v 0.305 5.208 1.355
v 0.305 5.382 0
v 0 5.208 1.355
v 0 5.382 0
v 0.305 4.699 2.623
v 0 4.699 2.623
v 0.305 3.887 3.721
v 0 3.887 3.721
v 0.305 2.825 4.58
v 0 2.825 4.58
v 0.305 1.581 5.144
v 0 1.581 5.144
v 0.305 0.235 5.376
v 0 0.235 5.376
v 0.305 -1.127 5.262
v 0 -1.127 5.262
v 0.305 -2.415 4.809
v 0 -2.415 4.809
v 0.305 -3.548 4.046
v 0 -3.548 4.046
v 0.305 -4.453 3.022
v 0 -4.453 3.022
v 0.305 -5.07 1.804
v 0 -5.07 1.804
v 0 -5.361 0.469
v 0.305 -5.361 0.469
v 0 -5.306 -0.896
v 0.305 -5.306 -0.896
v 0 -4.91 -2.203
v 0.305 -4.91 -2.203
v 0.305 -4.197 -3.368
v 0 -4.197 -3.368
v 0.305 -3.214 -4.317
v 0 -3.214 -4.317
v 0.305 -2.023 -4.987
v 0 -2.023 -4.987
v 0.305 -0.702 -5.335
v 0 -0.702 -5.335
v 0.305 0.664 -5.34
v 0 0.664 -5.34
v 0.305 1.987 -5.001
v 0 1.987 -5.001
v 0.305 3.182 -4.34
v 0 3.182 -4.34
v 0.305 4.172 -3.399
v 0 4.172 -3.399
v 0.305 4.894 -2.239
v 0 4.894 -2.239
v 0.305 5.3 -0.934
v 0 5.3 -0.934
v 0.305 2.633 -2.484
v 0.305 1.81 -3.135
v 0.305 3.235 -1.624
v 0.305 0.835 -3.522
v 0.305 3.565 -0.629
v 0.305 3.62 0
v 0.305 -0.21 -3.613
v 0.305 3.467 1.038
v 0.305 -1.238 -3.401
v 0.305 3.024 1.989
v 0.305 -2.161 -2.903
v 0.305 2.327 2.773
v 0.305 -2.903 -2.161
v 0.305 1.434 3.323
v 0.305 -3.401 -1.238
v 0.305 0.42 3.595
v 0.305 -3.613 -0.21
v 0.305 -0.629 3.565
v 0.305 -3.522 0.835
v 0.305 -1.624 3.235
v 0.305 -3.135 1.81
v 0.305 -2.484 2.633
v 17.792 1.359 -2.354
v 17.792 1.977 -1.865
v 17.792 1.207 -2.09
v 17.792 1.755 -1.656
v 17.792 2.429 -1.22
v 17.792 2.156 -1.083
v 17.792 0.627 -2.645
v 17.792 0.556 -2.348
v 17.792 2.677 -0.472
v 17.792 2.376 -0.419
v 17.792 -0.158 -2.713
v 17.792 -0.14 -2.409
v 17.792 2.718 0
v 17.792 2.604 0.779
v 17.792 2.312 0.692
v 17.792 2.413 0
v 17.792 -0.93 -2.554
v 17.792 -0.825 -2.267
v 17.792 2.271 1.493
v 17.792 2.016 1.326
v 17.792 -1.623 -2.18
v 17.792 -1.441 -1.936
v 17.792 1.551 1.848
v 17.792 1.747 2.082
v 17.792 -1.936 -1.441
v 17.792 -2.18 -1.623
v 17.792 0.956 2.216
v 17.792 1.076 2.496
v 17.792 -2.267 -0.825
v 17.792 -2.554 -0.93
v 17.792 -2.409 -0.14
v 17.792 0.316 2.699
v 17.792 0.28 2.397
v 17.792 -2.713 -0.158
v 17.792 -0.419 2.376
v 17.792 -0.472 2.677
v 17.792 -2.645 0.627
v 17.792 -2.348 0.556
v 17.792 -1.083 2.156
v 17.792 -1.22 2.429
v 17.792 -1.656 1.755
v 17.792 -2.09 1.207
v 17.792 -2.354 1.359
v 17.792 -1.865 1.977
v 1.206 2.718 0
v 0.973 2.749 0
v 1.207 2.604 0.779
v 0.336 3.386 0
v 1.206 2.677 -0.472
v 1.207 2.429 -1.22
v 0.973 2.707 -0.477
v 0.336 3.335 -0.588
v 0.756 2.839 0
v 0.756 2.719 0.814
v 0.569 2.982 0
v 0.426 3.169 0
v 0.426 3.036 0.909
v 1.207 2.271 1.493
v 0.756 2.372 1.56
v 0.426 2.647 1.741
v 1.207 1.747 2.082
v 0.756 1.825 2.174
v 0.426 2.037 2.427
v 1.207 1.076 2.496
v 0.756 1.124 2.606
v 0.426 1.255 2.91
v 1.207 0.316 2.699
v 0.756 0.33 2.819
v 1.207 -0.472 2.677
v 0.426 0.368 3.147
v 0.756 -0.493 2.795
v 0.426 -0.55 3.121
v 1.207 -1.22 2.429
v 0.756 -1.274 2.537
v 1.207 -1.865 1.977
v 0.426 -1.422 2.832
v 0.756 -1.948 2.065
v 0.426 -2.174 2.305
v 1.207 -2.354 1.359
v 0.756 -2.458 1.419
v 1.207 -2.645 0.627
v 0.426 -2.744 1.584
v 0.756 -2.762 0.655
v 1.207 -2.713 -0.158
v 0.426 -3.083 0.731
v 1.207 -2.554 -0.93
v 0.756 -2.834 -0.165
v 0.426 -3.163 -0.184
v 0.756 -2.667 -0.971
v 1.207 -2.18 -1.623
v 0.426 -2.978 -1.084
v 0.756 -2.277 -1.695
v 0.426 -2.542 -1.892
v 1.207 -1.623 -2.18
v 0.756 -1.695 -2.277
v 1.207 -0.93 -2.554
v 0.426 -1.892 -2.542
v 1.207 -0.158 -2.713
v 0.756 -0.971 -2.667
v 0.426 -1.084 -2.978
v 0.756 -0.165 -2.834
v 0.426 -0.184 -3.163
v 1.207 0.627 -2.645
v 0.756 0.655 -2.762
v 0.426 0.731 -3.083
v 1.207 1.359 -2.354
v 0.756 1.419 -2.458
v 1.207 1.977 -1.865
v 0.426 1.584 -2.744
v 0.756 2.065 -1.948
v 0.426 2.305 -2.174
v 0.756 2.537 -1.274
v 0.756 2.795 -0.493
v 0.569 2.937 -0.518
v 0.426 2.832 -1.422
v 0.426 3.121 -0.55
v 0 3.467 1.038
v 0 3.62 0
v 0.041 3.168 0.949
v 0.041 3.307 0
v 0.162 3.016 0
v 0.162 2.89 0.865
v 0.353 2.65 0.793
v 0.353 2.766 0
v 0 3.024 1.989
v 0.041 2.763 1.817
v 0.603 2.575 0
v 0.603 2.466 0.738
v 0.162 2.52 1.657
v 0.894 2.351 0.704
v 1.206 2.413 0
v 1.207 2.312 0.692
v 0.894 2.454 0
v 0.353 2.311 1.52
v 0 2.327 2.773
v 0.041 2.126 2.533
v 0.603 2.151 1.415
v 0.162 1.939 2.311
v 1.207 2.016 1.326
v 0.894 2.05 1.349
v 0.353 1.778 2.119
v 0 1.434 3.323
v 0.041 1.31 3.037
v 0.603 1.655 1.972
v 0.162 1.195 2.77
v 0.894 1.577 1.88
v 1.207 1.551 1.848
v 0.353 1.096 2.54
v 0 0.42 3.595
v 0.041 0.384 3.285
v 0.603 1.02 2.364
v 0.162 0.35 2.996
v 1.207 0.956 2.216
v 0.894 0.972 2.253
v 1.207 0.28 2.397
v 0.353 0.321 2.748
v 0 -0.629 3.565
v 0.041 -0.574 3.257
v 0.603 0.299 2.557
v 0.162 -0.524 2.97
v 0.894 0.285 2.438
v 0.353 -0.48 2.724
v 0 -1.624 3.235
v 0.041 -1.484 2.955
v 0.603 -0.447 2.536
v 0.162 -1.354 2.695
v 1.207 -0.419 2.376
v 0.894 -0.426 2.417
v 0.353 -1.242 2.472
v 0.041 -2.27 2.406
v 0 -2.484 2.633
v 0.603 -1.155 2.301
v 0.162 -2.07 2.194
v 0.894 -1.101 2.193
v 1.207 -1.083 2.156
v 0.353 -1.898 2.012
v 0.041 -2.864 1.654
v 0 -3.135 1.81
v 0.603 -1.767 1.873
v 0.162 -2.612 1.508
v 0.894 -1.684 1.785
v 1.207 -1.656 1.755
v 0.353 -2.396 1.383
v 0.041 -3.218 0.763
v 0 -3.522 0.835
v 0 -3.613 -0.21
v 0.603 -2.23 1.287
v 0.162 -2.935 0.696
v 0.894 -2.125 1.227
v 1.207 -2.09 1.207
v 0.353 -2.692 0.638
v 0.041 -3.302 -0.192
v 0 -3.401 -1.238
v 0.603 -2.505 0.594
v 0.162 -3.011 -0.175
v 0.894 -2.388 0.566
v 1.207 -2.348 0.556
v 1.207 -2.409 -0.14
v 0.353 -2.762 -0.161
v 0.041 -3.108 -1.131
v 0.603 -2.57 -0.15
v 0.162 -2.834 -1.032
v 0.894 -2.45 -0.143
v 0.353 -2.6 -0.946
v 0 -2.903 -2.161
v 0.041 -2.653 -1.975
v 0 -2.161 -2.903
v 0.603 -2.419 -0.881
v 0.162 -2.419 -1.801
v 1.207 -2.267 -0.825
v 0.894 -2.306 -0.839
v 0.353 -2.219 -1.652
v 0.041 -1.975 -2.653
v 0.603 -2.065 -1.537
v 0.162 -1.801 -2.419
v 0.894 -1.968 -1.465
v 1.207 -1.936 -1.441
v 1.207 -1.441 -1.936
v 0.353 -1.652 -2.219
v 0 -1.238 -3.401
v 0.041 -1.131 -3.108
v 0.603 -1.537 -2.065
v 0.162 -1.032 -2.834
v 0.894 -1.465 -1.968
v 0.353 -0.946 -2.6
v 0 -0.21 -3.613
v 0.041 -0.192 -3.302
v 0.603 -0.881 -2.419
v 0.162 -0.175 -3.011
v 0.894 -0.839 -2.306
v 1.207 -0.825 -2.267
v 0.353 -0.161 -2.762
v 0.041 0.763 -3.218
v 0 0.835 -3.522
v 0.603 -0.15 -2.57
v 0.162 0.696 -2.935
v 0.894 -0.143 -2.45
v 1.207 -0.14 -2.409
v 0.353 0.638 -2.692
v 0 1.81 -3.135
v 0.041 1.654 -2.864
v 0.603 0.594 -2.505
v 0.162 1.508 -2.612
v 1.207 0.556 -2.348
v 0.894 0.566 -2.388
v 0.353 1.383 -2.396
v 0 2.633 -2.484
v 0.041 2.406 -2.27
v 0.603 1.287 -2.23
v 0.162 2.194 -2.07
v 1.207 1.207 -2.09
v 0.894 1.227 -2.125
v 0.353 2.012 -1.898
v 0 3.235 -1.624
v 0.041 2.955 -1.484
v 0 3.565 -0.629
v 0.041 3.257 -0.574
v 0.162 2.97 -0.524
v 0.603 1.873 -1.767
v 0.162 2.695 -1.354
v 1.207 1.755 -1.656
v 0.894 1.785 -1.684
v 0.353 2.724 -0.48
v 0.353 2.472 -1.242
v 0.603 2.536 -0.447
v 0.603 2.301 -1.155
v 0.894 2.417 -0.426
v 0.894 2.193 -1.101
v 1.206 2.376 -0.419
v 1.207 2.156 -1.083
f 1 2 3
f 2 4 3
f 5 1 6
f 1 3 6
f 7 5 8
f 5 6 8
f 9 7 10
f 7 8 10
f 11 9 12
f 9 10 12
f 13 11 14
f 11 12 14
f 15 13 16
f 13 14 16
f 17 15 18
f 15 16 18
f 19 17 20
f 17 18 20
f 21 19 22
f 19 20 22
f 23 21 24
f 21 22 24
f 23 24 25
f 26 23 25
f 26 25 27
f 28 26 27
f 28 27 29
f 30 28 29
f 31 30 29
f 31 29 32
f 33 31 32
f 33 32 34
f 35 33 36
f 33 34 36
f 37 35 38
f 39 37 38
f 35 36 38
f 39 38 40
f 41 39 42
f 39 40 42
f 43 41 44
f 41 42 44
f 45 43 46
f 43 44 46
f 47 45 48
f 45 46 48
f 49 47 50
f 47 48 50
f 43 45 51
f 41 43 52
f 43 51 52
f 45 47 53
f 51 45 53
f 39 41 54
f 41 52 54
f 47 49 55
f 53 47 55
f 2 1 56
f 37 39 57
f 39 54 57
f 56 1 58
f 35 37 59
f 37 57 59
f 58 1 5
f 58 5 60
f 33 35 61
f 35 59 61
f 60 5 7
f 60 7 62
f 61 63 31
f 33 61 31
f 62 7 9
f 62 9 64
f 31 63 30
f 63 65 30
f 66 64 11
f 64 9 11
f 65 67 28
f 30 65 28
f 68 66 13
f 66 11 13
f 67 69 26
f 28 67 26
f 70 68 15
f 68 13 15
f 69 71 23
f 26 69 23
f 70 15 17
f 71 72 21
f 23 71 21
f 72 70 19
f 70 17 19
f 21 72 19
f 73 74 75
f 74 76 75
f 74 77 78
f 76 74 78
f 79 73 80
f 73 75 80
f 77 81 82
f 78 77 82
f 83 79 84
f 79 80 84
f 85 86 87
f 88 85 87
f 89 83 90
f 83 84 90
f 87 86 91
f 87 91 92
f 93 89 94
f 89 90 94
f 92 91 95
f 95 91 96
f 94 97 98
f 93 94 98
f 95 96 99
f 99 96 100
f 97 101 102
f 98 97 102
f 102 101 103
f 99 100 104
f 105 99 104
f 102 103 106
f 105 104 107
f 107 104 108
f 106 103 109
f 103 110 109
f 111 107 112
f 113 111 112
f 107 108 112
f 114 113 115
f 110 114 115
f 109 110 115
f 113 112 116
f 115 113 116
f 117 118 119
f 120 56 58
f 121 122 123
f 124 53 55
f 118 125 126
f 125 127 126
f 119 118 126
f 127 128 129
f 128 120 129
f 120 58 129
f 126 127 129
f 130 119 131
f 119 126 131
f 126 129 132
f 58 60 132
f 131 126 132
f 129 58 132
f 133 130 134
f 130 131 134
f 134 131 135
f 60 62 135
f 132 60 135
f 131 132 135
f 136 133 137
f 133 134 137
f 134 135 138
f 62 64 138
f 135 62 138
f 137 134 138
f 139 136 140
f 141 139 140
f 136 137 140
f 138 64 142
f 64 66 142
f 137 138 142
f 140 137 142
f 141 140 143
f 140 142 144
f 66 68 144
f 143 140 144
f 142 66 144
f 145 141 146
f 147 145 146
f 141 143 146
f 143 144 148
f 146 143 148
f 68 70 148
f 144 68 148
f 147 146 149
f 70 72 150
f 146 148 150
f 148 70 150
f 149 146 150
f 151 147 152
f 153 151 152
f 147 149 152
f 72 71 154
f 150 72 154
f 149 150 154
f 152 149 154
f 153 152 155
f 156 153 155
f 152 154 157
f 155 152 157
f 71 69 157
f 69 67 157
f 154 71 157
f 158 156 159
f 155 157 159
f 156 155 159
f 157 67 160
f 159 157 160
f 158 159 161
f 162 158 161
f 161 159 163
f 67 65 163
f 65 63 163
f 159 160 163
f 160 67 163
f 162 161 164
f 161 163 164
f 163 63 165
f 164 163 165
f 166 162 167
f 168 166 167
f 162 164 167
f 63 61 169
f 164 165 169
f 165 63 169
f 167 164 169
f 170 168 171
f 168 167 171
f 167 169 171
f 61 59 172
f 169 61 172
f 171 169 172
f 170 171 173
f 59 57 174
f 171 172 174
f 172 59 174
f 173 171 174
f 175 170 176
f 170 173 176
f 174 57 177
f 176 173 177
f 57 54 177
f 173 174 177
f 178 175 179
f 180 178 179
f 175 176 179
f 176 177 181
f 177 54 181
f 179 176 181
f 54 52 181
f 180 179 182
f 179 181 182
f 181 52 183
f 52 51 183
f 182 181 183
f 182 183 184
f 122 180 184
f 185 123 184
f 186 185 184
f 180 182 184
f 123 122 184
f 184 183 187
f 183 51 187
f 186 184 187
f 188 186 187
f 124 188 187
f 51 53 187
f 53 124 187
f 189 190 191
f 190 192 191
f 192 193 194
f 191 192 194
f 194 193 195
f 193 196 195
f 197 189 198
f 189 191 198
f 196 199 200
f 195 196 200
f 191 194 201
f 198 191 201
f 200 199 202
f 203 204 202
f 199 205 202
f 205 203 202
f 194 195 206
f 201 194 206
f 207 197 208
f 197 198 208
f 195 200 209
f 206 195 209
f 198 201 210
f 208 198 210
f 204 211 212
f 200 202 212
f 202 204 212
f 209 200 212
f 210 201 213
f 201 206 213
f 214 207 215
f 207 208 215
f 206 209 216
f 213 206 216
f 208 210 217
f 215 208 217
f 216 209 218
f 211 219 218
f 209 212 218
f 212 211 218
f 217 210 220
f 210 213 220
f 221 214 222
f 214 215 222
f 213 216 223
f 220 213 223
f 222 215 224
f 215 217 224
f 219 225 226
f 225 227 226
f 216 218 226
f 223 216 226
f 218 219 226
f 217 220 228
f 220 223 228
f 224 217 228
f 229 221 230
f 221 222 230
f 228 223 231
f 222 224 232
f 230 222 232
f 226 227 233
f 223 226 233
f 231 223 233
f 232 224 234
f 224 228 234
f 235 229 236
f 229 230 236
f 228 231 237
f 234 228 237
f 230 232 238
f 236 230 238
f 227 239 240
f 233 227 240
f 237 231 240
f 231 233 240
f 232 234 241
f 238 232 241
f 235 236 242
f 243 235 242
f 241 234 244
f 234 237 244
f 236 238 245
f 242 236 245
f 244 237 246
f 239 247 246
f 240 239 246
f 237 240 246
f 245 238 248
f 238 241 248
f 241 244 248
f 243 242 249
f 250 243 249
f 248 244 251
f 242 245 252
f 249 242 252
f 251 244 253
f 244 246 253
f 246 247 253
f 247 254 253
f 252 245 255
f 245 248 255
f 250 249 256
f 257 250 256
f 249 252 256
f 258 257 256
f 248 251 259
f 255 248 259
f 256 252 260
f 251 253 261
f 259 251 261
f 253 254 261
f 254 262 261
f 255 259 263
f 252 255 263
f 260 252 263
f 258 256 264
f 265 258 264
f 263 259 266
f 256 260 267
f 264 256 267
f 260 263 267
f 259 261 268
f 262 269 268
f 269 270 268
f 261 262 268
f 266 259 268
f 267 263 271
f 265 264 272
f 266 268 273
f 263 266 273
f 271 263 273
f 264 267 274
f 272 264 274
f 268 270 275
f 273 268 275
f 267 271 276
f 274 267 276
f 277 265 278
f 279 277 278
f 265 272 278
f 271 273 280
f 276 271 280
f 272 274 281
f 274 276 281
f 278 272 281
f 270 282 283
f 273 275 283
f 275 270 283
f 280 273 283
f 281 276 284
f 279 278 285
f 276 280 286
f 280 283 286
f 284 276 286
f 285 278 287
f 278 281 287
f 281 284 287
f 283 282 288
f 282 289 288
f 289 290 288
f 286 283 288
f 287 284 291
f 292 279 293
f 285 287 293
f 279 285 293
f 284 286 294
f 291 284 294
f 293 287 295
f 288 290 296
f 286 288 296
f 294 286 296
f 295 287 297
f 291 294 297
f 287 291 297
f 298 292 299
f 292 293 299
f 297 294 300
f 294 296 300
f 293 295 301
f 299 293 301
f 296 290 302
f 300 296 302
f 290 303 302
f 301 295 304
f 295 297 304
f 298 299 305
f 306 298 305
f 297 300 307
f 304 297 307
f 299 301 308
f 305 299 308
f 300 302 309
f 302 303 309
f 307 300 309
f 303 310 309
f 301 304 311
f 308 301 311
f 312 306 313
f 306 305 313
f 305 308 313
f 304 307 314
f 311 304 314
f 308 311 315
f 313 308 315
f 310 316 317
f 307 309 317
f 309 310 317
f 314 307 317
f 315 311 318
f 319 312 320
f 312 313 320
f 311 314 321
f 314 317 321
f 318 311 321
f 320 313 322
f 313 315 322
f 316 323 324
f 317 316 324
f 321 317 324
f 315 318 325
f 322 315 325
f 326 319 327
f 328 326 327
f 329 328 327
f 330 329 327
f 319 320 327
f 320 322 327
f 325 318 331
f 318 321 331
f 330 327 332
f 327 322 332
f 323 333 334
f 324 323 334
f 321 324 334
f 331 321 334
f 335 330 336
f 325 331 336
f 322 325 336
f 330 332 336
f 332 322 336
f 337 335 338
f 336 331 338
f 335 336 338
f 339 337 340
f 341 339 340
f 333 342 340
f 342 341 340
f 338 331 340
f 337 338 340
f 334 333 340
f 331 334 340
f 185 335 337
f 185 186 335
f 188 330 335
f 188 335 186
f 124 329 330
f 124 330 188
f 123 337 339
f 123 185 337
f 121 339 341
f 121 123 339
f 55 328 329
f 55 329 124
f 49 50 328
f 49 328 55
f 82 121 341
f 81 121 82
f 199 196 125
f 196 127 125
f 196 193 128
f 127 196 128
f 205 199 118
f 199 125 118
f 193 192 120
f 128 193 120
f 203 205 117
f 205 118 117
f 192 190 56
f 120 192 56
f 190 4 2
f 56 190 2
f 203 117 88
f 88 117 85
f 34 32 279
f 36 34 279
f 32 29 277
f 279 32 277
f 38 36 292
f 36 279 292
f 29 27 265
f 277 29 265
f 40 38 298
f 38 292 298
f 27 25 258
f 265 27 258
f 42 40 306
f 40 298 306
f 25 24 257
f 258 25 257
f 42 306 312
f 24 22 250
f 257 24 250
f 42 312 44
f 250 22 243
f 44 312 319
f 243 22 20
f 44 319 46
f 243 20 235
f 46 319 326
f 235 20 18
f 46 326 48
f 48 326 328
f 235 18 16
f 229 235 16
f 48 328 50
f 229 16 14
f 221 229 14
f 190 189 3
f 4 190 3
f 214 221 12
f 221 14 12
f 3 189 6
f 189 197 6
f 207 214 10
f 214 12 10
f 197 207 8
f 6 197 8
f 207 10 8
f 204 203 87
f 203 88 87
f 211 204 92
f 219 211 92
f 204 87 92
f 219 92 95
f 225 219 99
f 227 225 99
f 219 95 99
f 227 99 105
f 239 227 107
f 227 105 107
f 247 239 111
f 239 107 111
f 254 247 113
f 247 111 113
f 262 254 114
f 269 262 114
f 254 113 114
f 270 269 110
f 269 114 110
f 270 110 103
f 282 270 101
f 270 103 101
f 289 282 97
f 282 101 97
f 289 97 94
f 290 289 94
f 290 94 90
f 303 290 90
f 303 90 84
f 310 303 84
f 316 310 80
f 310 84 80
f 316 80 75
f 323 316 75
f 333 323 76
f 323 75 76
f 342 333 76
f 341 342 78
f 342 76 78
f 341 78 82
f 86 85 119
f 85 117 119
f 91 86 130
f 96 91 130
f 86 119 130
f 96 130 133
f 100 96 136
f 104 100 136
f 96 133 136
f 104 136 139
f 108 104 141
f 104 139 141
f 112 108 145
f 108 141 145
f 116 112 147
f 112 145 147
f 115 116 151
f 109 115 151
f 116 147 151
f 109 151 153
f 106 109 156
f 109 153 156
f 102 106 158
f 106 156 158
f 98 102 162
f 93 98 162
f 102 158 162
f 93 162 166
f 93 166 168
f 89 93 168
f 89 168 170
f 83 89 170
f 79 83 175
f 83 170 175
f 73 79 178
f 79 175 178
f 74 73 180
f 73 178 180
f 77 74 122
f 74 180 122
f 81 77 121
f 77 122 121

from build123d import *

# Parameters (mm, degrees)
F1_ANGLE = 350


with BuildPart() as f1:
    # F0 (on Top) → F1 (revolve)
    with BuildSketch(Plane.XY):
        with BuildLine():
            Line((1.2065, 2.413), (17.792, 2.413))
            Line((17.792, 2.413), (17.792, 2.7178))
            Line((17.792, 2.7178), (1.2065, 2.7178))
            ThreePointArc((1.2065, 2.7178), (0.568902, 2.981902), (0.3048, 3.6195))
            Line((0.3048, 3.6195), (0.3048, 5.3815))
            Line((0.3048, 5.3815), (0, 5.3815))
            Line((0, 5.3815), (0, 3.6195))
            ThreePointArc((0, 3.6195), (0.353376, 2.766376), (1.2065, 2.413))
        make_face()
    revolve(axis=Axis((8.896, 0, 0), (1, 0, 0)), revolution_arc=F1_ANGLE)


solid = f1.part
